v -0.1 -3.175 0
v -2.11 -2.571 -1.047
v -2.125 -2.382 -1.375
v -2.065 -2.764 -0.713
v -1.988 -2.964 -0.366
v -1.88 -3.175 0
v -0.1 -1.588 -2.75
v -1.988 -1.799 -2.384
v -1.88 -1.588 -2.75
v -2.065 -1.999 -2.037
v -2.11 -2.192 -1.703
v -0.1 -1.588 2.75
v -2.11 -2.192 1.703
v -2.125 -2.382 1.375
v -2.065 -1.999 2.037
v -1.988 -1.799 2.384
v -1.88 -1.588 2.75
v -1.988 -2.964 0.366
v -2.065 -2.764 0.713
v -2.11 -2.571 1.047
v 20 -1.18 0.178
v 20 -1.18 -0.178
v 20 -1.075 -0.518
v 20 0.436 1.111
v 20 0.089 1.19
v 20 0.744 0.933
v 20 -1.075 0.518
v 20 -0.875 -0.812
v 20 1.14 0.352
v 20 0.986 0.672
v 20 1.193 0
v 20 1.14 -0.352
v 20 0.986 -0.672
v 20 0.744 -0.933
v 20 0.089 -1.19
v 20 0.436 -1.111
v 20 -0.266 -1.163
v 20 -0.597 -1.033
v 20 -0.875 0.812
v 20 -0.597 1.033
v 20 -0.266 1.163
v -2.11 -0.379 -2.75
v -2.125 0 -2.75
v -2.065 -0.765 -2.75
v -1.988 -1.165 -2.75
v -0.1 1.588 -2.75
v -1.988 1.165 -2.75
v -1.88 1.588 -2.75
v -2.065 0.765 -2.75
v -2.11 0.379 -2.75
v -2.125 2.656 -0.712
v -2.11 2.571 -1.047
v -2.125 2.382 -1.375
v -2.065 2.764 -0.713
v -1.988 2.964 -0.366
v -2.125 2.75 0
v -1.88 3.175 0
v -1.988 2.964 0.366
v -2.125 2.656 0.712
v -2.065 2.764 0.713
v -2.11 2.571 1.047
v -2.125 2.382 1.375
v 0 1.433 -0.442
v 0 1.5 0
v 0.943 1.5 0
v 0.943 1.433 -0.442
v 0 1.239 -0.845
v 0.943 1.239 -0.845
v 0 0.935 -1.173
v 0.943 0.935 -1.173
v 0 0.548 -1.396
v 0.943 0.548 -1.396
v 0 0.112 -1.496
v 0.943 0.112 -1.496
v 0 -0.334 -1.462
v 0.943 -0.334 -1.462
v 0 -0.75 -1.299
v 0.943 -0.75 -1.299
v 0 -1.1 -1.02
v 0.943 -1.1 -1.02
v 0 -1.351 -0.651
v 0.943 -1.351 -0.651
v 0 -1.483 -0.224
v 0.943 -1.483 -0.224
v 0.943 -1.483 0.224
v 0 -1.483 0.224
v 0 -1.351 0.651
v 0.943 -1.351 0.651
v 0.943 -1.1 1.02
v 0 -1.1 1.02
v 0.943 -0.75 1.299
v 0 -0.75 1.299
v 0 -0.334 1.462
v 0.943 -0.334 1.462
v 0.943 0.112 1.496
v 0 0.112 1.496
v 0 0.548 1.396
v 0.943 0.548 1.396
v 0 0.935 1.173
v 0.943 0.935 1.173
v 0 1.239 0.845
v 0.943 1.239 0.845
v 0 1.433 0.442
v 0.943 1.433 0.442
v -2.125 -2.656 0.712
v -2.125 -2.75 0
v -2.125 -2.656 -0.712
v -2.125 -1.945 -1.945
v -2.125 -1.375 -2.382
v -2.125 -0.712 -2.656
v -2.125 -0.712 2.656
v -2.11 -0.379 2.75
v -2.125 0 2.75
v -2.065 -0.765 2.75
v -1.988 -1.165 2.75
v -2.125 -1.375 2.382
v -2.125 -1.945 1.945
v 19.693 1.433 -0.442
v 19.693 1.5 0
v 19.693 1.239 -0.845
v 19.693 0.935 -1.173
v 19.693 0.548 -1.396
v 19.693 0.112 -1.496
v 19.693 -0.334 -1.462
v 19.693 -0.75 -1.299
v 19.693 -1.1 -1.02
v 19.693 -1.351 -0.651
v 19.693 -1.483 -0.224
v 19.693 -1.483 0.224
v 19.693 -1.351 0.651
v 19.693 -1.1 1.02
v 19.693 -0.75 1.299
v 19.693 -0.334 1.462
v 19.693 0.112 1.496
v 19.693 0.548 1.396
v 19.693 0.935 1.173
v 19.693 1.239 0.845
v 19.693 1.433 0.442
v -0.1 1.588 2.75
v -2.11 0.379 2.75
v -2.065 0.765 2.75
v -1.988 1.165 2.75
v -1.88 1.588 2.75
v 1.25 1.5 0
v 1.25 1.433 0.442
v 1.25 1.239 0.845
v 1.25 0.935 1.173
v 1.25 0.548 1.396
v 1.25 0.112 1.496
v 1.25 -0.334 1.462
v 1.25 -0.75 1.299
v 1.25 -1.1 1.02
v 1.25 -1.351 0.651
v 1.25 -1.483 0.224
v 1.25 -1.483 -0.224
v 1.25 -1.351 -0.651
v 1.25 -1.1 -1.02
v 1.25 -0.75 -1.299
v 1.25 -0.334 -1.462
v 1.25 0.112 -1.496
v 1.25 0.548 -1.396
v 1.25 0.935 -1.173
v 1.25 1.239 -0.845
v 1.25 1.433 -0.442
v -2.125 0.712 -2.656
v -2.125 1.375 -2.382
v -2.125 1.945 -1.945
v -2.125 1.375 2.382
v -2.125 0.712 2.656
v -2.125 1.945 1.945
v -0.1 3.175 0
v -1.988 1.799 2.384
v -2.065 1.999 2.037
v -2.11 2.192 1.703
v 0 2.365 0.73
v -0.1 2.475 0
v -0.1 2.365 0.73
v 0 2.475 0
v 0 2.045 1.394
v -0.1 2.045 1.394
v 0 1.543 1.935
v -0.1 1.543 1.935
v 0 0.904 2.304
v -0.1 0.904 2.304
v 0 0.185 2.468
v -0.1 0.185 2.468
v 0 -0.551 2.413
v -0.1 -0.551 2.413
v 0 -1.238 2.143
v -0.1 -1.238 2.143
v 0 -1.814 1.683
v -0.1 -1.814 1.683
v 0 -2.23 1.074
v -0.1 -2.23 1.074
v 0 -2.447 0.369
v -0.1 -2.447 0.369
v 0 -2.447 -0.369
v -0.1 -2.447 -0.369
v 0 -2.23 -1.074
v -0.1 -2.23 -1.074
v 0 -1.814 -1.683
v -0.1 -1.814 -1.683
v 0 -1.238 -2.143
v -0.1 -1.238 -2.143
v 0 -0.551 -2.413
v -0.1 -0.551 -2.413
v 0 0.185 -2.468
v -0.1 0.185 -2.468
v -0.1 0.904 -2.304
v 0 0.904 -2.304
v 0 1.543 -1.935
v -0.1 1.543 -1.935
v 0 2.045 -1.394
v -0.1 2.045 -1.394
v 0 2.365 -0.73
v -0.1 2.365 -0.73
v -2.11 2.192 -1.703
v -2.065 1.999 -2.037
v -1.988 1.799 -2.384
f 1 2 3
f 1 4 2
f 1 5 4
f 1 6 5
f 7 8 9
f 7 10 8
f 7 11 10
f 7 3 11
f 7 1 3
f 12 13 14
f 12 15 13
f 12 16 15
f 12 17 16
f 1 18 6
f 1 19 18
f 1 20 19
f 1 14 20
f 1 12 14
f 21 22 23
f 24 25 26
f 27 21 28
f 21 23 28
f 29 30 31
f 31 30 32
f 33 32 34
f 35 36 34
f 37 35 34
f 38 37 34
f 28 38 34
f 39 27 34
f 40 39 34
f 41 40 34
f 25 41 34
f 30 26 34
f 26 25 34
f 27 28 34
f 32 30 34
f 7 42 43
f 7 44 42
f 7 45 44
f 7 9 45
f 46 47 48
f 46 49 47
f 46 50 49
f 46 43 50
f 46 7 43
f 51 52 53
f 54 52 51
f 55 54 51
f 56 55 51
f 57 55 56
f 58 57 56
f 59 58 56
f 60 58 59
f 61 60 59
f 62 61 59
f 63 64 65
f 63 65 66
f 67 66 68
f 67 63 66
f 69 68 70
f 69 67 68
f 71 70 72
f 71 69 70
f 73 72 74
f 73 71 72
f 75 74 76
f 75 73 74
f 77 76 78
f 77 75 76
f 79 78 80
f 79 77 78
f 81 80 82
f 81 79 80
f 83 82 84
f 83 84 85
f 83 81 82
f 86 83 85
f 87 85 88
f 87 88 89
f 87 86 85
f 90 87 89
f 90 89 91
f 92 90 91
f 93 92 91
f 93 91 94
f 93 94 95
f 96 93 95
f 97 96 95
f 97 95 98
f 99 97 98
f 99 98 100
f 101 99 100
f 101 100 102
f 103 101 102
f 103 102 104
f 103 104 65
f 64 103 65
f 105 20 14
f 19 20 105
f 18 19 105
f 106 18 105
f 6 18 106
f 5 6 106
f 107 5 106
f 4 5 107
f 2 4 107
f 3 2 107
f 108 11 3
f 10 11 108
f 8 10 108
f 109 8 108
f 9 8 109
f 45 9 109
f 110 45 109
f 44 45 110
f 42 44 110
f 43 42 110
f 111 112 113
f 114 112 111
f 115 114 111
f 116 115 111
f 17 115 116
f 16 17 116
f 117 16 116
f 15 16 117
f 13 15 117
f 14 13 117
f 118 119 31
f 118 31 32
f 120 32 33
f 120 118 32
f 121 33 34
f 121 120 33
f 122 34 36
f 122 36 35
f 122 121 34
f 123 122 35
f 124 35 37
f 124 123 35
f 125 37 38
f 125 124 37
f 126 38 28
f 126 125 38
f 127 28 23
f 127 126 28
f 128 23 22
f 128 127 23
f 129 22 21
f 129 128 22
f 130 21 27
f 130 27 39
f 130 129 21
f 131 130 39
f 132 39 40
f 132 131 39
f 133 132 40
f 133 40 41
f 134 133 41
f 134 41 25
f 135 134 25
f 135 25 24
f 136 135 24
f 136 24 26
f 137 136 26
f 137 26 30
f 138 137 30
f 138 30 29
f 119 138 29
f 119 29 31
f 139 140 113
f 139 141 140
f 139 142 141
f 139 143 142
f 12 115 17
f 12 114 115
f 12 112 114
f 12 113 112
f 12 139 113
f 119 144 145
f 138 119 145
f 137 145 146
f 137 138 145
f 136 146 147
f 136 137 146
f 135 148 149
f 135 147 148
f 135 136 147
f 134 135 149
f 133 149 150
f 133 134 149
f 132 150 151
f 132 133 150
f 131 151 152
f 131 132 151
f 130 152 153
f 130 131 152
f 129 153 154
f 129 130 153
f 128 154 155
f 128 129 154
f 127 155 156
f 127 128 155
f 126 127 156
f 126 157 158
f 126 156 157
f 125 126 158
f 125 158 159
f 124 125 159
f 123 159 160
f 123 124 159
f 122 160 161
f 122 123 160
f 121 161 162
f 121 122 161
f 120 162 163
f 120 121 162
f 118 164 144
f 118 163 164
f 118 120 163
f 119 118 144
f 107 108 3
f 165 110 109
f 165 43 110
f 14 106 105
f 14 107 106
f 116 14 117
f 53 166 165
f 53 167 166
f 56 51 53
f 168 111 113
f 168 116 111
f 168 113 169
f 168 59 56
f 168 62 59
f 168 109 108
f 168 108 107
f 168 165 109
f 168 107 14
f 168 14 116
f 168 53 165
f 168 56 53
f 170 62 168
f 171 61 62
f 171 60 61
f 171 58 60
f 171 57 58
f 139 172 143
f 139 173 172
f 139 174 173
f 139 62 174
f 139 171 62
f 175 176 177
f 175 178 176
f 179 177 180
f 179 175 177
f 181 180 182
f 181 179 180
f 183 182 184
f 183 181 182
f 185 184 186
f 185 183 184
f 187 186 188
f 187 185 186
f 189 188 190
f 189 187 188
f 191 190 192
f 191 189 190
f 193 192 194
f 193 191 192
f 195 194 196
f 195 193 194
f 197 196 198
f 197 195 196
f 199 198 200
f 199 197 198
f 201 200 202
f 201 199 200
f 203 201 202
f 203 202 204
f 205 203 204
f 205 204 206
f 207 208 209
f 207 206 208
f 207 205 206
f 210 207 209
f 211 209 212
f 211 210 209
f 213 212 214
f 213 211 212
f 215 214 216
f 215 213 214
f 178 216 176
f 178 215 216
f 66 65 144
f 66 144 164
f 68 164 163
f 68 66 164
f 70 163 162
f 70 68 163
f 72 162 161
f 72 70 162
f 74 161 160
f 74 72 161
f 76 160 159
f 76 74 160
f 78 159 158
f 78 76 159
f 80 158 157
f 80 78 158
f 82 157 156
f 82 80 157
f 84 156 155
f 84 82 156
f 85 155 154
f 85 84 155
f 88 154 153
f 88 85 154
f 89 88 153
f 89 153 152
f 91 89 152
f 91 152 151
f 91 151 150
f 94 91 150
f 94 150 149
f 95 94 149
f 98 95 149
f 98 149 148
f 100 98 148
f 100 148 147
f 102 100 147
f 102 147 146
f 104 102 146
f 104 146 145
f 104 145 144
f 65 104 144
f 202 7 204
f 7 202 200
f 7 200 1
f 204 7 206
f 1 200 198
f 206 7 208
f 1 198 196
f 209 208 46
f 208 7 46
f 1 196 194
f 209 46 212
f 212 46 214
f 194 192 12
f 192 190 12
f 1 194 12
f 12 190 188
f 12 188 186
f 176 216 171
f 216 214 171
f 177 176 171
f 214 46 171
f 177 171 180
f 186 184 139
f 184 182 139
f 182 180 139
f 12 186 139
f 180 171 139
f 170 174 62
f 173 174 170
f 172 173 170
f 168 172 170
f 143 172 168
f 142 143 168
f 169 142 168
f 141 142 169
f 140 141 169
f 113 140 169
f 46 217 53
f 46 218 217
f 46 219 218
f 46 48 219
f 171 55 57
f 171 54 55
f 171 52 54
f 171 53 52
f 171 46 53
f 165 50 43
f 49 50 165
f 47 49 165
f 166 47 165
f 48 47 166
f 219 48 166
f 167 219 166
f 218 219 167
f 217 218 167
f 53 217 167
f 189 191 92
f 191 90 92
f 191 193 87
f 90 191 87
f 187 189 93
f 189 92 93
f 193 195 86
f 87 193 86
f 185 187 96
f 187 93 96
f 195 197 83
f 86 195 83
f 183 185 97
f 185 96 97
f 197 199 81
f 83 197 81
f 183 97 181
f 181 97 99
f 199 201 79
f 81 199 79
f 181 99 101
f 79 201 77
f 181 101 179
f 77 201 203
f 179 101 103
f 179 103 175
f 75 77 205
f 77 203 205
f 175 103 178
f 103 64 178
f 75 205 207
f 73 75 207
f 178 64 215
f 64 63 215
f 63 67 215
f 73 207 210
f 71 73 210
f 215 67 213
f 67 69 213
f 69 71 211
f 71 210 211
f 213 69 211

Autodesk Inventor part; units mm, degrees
ref_plane "YZ Plane" through (0, 0, 0) normal (1, 0, 0) x (0, 1, 0)
ref_plane "XZ Plane" through (0, 0, 0) normal (0, 1, 0) x (-1, 0, 0)
sketch "Sketch1" plane through (0, 0, 0) normal (0, 0, 1) x (1, 0, 0)
  line L0 (0, 2.475) -> (0, 1.5)
  line L1 (1.25, 1.5) -> (20, 1.5)
  line L2 (20, 1.5) -> (20, 0)
  line L3 (20, 0) -> (-0.1001, 0)
  line L4 (-4.1201, 0) -> (24.02, 0) projected
  line L5 (-0.1001, 0) -> (-0.1001, 2.475)
  line L6 (-0.1001, 2.475) -> (0, 2.475)
  line L7 (1.25, 1.5) -> (0.9432, 1.5)
  line L8 (0.9432, 1.5) -> (0, 1.5)
  line L9 (0, -0.495) -> (0, 2.97) projected
  dimension "d2" = 3
  dimension "d9" = 0.1001
  dimension "d10" = 4.95
  dimension "d13" = 0.3068
  dimension "d14" = 3
  dimension "d59" = 20
revolve "Body" add sketch "Sketch1" angle 360 about axis through (20, 0, 0) along (-1, 0, 0)
sketch "Sketch2" plane through (-0.1001, 0, 0) normal (-1, 0, 0) x (0, 0, 1)
  line L0 (0, 3.1754) -> (2.75, 1.5877)
  line L1 (2.75, 1.5877) -> (2.75, -1.5877)
  line L2 (2.75, -1.5877) -> (0, -3.1754)
  line L3 (0, -3.1754) -> (-2.75, -1.5877)
  line L4 (-2.75, -1.5877) -> (-2.75, 1.5877)
  line L5 (-2.75, 1.5877) -> (0, 3.1754)
  point P0 (0, 0)
  point P1 (0, 0)
  dimension "d11" = 5.5
extrude "Head" add sketch "Sketch2" along normal blind 2.025
sketch "Sketch4" plane through (0, 0, 0) normal (0, 0, 1) x (1, 0, 0)
  line L0 (-2.1251, 2.75) -> (-2.1251, 3.1754)
  line L1 (-2.1251, 3.1754) -> (-1.8795, 3.1754)
  line L2 (-1.8795, 3.1754) -> (-2.1251, 2.75)
  line L3 (-2.5301, 0) -> (0.3049, 0) projected
  line L4 (-0.1001, 3.1754) -> (-2.1251, 3.1754) projected
  line L5 (-2.1251, 1.5877) -> (-2.1251, 3.1754) projected
  dimension "d5" = 30
  dimension "d19" = 5.5
revolve "Chamfer1" cut sketch "Sketch4" angle 360 about axis through (-10, 0, 0) along (1, 0, 0)
thread "Thread" size "M3x0.5" class "6g" standard "ISO Metric profile" length 14
chamfer "Chamfer2" distance 0.3067 distance2 0.3068 1 edges at (20, -1.5, 0) measured on face at (20, -0.3888, -0.2119)
ref_plane "Work Plane1" through (1.525, 0, 0) normal (0, 0, 1) x (1, 0, 0)
equation "\"d11\" = SW"
equation "\"d3\" = KOH - SD"
equation "\"d5\" = ANG1"
equation "\"d19\" = SW0"
equation "\"d6\" = -0.5 * SPD + 0.5 * GD"
equation "\"d2\" = GD"
equation "\"d10\" = SD2"
equation "\"d14\" = BDM"
equation "\"GD\" = NND"
equation "\"BDM\" = NND"
equation "\"KOH\" = 2.125"
equation "\"GEL\" = 8.75"
equation "\"SW\" = 5.5"
equation "\"SW0\" = SW"
equation "\"SPD\" = NND - 1.2269 * PTC"
equation "\"SD2\" = 0.9 * SW"
equation "\"SD\" = 0.1"
equation "\"ANG1\" = 30deg"
equation "\"GAL\" = 0.61345 * PTC"
equation "\"GUL\" = 0.61345 * PTC"
equation "\"RR\" = 0.3"
equation "\"GD1\" = THREADDIA - 1.2269 * PTC"
equation "\"THREADDIA\" = 3"
equation "\"SDH\" = 5.08"
equation "\"SDHG\" = 1.25"
equation "\"TOA\" = 30deg"
equation "\"PTC\" = 0.5"
equation "\"NND\" = 3"
equation "\"E0\" = 1.155 * SW"
properties part number "M3 x 10 - Hex. Head Set Screw (MS)" material "Stainless Steel"
